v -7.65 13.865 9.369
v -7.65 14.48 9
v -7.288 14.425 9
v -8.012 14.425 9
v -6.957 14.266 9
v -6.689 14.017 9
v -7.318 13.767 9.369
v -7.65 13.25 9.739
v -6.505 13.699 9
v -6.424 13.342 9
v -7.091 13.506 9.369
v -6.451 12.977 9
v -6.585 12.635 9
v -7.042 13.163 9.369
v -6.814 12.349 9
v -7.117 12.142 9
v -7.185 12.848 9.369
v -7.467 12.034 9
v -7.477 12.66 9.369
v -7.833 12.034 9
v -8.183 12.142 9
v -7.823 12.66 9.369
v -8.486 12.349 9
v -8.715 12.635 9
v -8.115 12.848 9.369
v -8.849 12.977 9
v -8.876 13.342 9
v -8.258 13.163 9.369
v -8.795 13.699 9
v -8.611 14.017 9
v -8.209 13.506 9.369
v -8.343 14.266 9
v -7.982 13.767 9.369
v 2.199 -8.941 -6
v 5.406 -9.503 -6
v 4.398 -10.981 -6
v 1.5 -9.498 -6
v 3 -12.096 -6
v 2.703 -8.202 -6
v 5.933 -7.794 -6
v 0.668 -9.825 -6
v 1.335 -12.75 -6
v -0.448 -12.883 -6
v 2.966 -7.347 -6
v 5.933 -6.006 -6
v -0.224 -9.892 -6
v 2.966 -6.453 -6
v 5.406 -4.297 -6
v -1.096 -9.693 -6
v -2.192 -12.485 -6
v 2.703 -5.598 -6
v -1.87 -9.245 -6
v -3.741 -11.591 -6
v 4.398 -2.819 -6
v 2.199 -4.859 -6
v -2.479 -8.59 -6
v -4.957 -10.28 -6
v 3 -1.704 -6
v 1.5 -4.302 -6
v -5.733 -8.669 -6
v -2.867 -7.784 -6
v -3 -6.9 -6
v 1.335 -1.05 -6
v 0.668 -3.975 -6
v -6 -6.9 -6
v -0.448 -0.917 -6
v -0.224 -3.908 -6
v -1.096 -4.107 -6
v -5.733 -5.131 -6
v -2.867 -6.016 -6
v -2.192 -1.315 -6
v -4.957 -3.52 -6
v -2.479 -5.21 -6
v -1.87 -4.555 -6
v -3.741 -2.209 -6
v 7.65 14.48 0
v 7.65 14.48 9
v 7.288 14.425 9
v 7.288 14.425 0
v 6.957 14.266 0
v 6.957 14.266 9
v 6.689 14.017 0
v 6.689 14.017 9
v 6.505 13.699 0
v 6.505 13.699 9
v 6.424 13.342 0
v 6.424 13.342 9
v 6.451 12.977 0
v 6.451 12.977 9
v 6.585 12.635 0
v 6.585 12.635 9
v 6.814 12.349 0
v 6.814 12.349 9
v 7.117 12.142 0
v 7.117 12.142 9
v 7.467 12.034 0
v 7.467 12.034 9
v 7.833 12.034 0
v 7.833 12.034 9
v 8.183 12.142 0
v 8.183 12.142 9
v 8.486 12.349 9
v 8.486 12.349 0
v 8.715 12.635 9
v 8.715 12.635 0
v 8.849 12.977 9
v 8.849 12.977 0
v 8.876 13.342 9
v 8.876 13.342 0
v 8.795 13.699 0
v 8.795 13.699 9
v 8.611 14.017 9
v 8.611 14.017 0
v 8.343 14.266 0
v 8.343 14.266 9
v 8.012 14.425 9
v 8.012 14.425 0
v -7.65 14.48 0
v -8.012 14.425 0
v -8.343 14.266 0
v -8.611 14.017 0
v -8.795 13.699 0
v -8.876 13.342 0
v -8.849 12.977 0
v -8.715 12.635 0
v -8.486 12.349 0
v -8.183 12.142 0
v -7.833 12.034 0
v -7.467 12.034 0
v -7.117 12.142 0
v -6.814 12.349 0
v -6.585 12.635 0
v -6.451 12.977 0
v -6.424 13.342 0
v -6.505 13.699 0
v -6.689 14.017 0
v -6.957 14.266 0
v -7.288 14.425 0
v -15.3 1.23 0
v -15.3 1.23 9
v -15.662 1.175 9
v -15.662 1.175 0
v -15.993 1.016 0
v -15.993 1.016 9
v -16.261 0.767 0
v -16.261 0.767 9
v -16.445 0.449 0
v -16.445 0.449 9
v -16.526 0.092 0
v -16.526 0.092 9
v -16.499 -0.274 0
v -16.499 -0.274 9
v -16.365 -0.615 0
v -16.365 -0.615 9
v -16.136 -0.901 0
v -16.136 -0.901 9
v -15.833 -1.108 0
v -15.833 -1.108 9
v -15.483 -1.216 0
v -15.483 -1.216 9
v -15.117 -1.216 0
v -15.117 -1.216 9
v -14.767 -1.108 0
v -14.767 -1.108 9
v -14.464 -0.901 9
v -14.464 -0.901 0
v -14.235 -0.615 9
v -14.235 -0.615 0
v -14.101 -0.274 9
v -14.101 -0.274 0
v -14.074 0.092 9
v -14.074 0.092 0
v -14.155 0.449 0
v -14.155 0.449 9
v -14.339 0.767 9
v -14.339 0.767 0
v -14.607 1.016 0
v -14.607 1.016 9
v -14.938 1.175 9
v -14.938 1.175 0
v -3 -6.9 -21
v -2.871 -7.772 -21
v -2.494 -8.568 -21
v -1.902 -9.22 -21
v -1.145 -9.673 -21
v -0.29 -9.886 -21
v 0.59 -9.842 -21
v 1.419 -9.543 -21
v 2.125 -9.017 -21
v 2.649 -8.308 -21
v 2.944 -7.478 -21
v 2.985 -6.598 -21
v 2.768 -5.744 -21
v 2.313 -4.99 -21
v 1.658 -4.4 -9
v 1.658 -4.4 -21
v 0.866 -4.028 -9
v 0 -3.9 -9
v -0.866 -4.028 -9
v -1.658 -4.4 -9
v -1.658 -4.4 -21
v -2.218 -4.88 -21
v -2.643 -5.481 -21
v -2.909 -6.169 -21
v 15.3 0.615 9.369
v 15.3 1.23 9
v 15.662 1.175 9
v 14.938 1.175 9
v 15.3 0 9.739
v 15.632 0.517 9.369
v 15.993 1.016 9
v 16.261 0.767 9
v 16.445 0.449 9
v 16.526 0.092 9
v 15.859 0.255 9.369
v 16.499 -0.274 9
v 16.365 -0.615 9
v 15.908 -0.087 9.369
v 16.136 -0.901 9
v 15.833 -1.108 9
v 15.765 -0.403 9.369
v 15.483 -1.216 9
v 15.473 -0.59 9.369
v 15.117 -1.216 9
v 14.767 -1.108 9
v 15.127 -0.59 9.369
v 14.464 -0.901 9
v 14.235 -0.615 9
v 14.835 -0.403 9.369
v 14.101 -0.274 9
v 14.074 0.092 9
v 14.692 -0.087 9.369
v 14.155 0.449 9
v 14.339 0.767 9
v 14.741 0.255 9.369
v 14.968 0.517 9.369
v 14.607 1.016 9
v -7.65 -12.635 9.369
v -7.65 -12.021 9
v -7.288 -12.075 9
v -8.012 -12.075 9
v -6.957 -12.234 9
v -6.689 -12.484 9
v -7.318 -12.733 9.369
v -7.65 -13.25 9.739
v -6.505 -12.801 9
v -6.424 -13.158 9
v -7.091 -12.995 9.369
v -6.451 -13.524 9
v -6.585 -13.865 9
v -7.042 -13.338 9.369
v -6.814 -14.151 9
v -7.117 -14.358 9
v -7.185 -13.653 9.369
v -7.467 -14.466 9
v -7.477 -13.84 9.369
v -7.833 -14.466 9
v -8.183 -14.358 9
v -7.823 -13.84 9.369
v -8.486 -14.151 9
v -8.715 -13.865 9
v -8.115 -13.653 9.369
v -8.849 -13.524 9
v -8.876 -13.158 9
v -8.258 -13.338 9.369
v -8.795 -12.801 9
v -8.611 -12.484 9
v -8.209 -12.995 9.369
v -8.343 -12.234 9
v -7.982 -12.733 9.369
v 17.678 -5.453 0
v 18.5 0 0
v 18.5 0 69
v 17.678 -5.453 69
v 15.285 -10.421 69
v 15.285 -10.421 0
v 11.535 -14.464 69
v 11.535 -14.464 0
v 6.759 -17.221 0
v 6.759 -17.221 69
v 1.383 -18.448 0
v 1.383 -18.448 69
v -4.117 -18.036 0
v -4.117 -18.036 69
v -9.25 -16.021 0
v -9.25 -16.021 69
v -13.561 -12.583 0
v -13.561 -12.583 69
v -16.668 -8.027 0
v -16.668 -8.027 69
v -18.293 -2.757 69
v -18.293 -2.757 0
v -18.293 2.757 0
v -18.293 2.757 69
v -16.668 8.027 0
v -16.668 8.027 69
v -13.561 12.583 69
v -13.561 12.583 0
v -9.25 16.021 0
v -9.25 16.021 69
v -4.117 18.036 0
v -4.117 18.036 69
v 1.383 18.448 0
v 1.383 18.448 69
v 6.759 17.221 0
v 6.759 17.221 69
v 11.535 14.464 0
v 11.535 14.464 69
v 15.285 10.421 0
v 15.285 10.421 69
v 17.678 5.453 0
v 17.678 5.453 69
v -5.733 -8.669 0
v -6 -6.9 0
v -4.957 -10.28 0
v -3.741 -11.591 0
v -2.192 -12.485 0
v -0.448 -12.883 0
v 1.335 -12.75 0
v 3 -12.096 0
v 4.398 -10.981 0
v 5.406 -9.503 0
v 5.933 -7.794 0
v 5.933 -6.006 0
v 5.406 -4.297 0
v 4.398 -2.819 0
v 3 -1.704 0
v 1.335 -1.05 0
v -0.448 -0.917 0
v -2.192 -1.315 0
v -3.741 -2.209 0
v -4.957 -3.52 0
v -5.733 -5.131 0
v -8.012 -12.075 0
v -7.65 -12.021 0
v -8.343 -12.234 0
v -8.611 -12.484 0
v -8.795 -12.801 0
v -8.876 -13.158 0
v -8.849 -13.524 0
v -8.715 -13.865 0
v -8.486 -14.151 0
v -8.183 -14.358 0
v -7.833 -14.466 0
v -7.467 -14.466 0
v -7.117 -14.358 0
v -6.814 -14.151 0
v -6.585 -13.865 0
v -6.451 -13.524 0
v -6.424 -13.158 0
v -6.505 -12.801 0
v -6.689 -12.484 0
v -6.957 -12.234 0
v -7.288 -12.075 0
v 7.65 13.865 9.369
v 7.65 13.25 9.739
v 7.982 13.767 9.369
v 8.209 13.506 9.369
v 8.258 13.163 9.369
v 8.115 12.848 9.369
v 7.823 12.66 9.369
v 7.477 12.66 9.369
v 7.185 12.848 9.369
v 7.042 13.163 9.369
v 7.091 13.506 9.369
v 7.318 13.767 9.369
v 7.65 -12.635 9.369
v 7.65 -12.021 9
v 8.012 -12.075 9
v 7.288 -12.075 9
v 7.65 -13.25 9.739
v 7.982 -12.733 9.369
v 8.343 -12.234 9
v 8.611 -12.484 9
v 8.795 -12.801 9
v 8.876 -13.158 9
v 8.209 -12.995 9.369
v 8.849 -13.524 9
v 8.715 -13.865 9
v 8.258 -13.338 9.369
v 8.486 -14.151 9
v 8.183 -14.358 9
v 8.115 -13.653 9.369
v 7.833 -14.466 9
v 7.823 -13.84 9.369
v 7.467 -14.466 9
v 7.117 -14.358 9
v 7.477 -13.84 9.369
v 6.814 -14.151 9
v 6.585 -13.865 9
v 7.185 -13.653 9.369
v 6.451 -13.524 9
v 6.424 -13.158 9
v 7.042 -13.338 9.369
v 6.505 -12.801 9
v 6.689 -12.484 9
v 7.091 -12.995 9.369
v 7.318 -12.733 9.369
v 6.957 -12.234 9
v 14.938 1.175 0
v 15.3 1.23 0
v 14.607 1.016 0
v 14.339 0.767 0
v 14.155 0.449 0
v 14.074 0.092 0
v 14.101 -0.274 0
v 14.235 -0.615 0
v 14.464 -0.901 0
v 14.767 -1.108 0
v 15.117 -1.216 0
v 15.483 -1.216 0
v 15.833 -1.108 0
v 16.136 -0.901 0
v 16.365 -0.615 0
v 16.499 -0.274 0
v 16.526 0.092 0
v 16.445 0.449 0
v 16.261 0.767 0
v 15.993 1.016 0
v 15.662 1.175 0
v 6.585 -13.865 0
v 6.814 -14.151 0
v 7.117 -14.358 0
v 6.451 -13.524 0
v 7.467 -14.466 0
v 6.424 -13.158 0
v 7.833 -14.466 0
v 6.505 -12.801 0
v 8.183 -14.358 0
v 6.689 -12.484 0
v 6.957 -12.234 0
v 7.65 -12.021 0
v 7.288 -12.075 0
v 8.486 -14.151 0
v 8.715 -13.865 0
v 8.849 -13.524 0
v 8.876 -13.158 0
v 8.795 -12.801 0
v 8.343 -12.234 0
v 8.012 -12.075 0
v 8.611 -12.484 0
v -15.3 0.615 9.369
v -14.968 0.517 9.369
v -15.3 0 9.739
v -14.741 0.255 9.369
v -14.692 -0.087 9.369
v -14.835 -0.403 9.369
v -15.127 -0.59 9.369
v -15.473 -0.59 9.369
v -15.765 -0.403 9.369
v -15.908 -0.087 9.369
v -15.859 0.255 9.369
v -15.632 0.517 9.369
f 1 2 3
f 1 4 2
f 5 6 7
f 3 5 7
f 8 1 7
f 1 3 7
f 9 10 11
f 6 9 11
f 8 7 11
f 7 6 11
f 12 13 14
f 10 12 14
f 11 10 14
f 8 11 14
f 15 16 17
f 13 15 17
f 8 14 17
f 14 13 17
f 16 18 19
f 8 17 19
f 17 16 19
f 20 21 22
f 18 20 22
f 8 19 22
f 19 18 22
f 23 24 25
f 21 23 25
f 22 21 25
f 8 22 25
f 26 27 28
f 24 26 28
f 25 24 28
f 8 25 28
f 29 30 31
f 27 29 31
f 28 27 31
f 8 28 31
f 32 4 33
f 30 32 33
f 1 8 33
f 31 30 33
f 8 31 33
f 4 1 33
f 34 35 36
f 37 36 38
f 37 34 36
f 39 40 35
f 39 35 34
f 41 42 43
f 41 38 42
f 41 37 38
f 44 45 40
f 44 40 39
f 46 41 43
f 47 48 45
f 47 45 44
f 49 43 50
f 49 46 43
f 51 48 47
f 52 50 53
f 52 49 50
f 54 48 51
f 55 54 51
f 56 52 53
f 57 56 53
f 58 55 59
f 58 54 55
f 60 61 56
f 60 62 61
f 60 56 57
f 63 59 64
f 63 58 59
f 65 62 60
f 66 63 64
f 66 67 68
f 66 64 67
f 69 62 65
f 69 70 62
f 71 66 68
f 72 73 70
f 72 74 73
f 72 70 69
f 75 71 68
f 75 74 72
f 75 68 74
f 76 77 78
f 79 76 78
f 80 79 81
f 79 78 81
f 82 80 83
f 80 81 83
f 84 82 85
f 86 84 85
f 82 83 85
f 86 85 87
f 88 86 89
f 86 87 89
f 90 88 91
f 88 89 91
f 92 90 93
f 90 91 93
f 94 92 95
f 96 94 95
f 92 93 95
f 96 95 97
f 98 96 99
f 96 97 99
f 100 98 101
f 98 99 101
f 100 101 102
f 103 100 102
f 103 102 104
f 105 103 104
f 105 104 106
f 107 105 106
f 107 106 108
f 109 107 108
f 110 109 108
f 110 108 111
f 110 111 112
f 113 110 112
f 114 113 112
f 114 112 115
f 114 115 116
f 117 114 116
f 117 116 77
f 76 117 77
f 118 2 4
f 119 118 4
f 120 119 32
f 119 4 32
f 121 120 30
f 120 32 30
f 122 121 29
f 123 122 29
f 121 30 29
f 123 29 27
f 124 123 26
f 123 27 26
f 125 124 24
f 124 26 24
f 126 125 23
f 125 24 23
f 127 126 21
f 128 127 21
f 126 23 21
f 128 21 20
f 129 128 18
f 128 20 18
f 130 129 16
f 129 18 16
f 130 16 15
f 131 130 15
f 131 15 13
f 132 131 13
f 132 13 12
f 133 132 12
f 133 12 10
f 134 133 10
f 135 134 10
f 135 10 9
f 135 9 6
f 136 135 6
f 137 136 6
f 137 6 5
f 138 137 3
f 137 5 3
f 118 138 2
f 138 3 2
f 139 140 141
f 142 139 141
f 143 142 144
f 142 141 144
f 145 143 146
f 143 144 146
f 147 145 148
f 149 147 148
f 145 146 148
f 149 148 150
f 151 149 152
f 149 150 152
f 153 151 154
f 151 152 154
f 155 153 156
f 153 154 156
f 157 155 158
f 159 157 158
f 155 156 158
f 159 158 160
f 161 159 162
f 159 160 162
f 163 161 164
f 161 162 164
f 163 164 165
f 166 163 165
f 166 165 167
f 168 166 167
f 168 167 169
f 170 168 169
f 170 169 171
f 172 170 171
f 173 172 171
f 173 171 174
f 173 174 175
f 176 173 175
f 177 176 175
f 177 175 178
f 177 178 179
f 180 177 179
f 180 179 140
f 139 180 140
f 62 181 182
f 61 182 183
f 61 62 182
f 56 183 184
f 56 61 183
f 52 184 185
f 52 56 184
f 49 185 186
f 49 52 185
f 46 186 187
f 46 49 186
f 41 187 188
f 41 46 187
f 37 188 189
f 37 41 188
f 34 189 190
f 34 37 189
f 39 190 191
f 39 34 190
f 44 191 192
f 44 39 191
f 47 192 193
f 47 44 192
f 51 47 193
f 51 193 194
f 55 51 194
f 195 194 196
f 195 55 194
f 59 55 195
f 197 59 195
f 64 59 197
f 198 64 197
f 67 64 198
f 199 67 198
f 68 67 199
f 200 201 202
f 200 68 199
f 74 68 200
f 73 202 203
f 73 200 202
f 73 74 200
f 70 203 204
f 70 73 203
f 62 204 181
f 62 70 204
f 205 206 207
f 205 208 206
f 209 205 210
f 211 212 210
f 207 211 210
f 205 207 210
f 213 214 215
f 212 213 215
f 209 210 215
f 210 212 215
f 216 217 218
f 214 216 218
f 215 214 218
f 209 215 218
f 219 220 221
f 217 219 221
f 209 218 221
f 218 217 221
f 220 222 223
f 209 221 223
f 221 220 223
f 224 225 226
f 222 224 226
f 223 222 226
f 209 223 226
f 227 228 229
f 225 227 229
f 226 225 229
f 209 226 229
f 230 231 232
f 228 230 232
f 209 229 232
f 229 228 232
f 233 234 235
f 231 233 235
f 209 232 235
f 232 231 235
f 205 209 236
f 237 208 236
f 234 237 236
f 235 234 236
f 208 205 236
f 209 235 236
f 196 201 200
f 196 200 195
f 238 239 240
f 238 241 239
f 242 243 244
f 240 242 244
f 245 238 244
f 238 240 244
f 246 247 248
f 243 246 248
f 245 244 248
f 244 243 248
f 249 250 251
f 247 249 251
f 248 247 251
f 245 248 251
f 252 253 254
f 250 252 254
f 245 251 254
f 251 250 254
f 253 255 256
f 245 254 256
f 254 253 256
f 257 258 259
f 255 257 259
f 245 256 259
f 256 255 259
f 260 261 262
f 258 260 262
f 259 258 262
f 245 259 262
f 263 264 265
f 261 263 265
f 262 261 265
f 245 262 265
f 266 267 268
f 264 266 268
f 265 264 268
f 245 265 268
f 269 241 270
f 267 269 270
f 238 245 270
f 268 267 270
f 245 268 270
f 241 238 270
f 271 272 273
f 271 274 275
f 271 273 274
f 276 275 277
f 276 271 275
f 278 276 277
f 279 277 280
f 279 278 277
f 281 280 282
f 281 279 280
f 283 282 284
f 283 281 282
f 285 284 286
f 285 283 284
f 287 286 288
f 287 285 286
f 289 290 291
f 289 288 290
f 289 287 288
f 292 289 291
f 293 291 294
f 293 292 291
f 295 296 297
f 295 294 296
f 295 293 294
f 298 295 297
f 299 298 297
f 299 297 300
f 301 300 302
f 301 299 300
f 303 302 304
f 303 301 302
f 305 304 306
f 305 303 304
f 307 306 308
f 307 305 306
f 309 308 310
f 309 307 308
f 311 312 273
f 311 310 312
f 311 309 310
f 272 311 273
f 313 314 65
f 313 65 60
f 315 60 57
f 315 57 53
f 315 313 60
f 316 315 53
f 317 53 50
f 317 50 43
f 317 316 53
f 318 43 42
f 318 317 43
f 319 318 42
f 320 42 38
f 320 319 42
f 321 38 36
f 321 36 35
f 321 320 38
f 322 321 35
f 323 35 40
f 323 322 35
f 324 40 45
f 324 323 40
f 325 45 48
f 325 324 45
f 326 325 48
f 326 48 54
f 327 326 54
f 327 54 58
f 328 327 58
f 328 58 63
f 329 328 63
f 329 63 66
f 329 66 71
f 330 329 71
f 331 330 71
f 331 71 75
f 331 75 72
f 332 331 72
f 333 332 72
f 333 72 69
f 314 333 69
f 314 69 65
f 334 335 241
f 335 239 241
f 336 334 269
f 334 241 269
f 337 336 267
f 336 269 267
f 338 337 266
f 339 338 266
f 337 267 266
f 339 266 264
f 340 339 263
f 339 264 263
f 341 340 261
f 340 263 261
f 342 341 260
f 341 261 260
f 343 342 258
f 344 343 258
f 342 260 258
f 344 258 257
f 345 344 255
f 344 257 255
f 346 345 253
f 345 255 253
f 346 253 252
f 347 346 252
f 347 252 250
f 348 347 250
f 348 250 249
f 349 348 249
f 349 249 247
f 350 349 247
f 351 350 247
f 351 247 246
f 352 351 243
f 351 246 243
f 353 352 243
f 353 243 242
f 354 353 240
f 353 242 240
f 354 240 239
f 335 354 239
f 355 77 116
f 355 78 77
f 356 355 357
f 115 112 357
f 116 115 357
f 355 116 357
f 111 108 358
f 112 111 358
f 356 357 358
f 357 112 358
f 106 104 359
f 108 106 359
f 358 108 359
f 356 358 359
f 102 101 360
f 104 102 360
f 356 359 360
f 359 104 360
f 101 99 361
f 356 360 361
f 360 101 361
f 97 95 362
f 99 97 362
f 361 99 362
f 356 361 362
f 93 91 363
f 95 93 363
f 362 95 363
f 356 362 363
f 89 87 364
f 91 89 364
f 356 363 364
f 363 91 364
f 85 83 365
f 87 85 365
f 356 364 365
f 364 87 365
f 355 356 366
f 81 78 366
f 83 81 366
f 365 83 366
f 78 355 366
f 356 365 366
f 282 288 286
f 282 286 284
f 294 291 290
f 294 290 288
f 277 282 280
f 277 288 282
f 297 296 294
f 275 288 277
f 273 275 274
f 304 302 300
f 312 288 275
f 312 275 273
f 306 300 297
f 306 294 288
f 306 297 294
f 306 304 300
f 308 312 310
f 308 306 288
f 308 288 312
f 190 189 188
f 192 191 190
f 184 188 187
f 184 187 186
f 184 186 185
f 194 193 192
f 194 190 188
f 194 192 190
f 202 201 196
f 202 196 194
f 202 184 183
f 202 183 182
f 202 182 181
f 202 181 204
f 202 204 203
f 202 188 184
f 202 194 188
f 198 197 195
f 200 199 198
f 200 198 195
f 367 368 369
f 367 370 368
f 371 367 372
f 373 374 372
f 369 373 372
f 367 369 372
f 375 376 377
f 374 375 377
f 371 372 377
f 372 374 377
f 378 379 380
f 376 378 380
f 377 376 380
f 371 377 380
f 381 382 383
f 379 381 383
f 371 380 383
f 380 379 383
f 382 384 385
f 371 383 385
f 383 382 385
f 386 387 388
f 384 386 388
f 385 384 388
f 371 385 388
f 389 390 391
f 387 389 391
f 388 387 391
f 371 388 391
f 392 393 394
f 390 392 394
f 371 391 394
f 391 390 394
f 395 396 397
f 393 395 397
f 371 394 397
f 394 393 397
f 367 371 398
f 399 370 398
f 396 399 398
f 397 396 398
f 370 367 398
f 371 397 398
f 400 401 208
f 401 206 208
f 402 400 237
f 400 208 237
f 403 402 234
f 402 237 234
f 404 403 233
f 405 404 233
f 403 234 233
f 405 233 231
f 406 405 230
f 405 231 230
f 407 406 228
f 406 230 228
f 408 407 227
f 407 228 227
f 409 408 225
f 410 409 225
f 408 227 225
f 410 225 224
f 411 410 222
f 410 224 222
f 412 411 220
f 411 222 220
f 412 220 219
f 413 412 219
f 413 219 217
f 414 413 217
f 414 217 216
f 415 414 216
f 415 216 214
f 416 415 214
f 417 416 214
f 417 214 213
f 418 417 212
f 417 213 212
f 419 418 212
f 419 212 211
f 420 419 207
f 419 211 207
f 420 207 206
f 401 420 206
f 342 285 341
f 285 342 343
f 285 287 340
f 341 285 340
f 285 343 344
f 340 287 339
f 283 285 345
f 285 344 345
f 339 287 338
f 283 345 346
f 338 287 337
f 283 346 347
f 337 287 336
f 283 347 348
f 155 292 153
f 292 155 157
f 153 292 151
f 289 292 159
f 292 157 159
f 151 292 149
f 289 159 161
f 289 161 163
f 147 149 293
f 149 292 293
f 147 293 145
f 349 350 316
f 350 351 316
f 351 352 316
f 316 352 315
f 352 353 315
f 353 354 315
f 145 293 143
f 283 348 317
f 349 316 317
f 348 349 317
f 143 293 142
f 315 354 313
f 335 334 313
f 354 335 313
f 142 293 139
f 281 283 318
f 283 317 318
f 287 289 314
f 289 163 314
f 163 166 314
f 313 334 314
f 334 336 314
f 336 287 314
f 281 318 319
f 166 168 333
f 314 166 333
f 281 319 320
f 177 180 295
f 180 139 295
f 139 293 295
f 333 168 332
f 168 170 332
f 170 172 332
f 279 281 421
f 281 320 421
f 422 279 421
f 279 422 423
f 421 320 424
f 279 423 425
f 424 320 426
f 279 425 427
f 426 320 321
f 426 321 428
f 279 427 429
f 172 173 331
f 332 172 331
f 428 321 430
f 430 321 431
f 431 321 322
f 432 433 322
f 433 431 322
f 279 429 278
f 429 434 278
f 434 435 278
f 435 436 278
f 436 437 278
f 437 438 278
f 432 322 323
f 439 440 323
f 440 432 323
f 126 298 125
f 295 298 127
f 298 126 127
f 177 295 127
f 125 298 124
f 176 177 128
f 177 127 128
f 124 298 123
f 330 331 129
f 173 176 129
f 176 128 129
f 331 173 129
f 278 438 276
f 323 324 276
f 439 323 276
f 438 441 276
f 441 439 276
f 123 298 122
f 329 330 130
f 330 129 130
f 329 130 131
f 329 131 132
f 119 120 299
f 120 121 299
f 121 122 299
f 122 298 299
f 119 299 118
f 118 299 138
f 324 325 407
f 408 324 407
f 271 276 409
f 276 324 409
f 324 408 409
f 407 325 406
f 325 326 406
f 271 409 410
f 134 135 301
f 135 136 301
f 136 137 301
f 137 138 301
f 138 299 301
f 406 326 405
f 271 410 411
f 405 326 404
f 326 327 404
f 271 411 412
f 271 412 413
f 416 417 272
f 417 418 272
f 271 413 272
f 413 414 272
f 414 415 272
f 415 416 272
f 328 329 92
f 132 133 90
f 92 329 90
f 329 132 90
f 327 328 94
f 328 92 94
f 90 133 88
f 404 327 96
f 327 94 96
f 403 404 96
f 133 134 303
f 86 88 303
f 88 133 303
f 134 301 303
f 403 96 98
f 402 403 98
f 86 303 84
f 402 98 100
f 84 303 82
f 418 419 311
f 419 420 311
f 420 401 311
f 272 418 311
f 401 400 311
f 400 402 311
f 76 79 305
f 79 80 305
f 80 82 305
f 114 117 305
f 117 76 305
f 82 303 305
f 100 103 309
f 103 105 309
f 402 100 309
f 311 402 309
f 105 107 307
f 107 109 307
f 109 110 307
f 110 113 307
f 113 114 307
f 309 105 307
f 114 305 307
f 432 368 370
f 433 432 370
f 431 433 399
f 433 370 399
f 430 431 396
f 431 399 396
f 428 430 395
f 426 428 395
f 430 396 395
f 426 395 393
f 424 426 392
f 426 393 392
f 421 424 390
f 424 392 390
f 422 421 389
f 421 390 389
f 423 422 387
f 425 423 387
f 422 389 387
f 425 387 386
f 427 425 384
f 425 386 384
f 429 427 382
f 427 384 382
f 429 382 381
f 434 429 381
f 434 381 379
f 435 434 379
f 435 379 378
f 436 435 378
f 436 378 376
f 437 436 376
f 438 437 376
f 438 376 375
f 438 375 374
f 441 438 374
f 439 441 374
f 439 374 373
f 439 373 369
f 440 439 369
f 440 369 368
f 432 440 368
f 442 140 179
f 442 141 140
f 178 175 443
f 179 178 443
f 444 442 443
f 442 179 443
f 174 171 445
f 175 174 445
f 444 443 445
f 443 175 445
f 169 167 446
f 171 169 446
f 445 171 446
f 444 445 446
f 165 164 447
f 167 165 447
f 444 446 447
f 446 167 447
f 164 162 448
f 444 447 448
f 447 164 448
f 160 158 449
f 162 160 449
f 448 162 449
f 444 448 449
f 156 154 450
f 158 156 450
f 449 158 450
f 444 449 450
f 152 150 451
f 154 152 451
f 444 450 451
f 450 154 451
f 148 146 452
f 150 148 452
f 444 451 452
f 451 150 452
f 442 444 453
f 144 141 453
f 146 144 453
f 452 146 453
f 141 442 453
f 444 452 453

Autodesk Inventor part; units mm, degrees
ref_plane "YZ Plane" through (0, 0, 0) normal (1, 0, 0) x (0, 1, 0)
ref_plane "XZ Plane" through (0, 0, 0) normal (0, 1, 0) x (-1, 0, 0)
ref_plane "XY Plane" through (0, 0, 0) normal (0, 0, 1) x (1, 0, 0)
sketch "Schizzo1" plane through (0, 0, 0) normal (0, 0, 1) x (1, 0, 0)
  circle A0 centre (0, 0) radius 18.5
  dimension "d0" = 37
extrude "Estrusione1" add sketch "Schizzo1" along normal blind 69
sketch "Schizzo2" plane through (0, 0, 0) normal (0, 0, -1) x (-1, 0, 0)
  line L0 (0, 0) -> (15.3, 0)
  line L1 (0, 0) -> (15.3, 0) construction
  point P0 (7.65, 13.2502)
  point P1 (-7.65, 13.2502)
  point P2 (-15.3, 0)
  point P3 (-7.65, -13.2502)
  point P4 (7.65, -13.2502)
  dimension "d3" = 15.3
  dimension "d4" = 0
  dimension "d7" = 360
hole "Foro1" at (7.65, 13.2502, 0) at (-7.65, 13.2502, 0) at (15.3, 0, 0) at (7.65, -13.2502, 0) at (-7.65, -13.2502, 0) at (-15.3, 0, 0) direction (0, 0, 1) diameter 2.459 depth 9 tip angle 118 thread size "M3x0.5" class "6H" standard "ISO Metric profile"
sketch "Schizzo3" plane through (0, 0, 0) normal (0, 0, -1) x (-1, 0, 0)
  circle A0 centre (0, 0) radius 18.5 projected
  line L0 (0, 18.5) -> (0, -0.9)
  line L1 (0, -0.9) -> (0, -6.9)
  circle A1 centre (0, -6.9) radius 6
  dimension "d16" = 19.4
  dimension "d17" = 6
  dimension "d18" = 12
extrude "Estrusione2" add sketch "Schizzo3" along normal blind 6 contours A1
sketch "Schizzo4" plane through (0, -6.9, -6) normal (0, 0, -1) x (-1, 0, 0)
  circle A0 centre (0, 0) radius 6 projected
  circle A1 centre (0, 0) radius 3
  point P0 (0, 6.9)
  dimension "d21" = 6
extrude "Estrusione3" add sketch "Schizzo4" along normal blind 15 contours A1
sketch "Schizzo5" plane through (0, -6.9, -21) normal (0, 0, -1) x (-1, 0, 0)
  circle A0 centre (0, 0) radius 3
  circle A1 centre (0, 0) radius 3 projected
  line L0 (0, -3) -> (0, 2.5)
  line L1 (0, -3) -> (5.5, -3) construction
  line L2 (22.7528, -2.6034) -> (26.4877, -2.6034) construction
  line L3 (0, 2.5) -> (-1.6583, 2.5)
  line L4 (0, 2.5) -> (1.6583, 2.5)
  point P0 (0, 6.9)
  dimension "d24" = 6
  dimension "d25" = 5.5
  dimension "d26" = 90
extrude "Estrusione4" cut sketch "Schizzo5" against normal blind 12 contours L4 L3 A0
properties part number "29_Motore_6mm"
